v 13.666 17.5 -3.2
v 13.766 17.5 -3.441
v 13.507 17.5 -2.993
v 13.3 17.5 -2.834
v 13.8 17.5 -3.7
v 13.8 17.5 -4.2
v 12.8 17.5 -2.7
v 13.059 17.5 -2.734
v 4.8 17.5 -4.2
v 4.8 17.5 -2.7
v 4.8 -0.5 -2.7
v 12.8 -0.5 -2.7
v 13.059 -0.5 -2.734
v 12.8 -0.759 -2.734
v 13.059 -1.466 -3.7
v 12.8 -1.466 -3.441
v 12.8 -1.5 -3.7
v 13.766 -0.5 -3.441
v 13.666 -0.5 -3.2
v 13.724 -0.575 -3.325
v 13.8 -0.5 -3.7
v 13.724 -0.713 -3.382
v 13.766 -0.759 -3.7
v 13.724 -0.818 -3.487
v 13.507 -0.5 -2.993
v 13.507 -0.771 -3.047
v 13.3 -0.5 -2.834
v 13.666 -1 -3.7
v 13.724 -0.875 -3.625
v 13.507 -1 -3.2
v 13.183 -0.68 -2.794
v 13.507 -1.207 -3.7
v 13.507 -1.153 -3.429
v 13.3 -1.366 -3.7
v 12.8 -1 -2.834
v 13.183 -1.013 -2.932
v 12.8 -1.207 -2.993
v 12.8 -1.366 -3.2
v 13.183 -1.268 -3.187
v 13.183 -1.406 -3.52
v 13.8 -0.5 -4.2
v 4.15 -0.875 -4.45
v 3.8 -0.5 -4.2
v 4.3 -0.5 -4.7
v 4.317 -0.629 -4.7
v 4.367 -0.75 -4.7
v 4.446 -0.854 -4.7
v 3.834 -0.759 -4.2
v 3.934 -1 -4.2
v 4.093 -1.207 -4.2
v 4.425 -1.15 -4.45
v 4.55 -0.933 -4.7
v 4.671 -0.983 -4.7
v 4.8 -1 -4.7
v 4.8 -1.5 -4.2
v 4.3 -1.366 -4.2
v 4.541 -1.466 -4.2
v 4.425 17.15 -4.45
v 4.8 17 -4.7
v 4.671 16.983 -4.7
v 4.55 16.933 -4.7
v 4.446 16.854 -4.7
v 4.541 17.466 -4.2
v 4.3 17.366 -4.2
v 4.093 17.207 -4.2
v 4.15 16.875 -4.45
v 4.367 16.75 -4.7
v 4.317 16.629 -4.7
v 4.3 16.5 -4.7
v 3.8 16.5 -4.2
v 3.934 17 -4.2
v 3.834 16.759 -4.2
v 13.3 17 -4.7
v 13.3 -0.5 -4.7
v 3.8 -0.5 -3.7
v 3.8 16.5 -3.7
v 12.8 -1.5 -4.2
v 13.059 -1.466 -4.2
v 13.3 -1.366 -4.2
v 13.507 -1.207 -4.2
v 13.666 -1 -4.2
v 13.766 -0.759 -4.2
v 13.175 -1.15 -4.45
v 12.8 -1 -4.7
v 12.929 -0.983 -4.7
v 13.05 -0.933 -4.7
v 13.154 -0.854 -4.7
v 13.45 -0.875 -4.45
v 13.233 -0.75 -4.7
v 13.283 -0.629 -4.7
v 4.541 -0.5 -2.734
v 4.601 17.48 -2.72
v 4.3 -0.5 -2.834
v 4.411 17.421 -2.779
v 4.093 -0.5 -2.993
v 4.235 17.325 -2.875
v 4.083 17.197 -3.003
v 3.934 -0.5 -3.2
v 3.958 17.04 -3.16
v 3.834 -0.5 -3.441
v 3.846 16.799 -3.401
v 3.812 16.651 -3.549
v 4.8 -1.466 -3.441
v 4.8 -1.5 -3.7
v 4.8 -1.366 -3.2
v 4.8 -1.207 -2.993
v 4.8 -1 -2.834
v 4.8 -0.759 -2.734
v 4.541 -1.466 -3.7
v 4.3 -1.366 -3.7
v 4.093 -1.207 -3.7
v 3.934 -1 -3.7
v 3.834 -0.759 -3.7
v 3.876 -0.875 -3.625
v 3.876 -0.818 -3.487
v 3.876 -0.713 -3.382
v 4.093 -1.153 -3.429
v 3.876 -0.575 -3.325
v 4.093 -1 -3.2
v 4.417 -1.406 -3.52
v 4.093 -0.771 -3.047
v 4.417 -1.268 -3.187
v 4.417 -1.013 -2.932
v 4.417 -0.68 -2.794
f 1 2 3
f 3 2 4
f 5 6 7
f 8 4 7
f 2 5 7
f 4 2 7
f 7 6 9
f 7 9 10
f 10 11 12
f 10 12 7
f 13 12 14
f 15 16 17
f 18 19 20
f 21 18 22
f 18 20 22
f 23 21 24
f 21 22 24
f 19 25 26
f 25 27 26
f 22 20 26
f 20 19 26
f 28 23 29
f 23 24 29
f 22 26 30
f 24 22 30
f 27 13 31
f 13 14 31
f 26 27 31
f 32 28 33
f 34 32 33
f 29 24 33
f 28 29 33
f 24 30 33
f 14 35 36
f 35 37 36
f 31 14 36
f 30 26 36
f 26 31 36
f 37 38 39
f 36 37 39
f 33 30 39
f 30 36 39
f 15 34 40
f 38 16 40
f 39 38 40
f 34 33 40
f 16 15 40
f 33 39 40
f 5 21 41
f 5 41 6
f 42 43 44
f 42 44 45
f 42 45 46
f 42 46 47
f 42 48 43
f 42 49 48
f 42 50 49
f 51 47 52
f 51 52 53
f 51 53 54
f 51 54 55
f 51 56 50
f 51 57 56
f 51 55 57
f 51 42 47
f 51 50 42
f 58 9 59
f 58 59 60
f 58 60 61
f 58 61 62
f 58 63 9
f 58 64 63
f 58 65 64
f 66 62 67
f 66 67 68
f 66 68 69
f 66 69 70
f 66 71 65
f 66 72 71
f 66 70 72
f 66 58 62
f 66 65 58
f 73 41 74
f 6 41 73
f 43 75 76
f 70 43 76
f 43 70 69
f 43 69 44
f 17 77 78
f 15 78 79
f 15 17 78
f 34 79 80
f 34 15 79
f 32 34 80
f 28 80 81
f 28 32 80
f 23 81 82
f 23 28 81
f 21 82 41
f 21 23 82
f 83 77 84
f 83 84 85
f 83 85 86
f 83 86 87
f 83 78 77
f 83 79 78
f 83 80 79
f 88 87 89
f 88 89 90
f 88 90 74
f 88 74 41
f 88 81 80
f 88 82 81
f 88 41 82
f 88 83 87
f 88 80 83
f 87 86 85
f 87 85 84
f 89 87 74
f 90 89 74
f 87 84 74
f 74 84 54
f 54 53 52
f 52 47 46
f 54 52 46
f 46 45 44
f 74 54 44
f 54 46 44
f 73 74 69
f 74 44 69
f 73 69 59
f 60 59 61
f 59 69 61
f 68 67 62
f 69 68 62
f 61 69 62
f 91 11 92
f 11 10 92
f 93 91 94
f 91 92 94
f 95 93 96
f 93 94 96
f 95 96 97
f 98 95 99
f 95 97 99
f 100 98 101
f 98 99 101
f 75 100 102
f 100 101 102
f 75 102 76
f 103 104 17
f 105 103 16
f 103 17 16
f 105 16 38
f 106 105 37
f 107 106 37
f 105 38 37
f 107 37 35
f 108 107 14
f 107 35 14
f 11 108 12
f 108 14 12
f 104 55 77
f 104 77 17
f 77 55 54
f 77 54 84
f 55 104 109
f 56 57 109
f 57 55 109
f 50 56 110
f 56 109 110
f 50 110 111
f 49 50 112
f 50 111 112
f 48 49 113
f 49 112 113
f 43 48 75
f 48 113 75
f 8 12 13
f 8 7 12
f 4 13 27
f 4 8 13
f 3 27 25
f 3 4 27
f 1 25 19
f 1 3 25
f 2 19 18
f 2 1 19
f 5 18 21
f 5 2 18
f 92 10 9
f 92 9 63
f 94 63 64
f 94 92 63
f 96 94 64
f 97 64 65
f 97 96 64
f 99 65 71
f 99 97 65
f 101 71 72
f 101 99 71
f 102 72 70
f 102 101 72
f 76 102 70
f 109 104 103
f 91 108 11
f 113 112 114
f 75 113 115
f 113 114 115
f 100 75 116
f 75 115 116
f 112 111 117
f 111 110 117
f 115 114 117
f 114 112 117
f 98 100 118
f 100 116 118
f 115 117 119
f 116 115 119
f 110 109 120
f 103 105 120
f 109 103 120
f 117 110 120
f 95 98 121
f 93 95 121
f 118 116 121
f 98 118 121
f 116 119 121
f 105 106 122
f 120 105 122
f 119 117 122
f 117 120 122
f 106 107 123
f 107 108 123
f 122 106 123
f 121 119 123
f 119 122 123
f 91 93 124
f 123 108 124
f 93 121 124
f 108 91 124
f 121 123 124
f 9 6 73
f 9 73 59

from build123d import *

# Parameters (mm, degrees)
SKETCH005_W     = 19
SKETCH005_H     = 2
PAD004_DEPTH    = 10
FILLET003_R     = 1
CHAMFER005_SIZE = 0.5


with BuildPart() as part:
    # Sketch005 → Pad004 (new body)
    with BuildSketch(Plane.YZ):
        with Locations((-9.5, 1)):
            Rectangle(SKETCH005_W, SKETCH005_H)
    extrude(amount=PAD004_DEPTH)

    # Fillet003
    fillet003_edges = [part.edges().sort_by_distance(p)[0] for p in [
        (5, -19, 2),
        (0, -19, 1),
        (0, -9.5, 2),
        (10, -9.5, 2),
        (0, 0, 1),
        (10, -19, 1),
    ]]
    fillet(fillet003_edges, radius=FILLET003_R)

    # Chamfer005
    chamfer005_edges = [part.edges().sort_by_distance(p)[0] for p in [
        (10, -9, 0),
    ]]
    chamfer(chamfer005_edges, length=CHAMFER005_SIZE)


with BuildPart() as part_1:
    # Body005 placement: moved
    add(part.part.moved(Location((3.8, 17.5, -4.7))))


solid = part_1.part
